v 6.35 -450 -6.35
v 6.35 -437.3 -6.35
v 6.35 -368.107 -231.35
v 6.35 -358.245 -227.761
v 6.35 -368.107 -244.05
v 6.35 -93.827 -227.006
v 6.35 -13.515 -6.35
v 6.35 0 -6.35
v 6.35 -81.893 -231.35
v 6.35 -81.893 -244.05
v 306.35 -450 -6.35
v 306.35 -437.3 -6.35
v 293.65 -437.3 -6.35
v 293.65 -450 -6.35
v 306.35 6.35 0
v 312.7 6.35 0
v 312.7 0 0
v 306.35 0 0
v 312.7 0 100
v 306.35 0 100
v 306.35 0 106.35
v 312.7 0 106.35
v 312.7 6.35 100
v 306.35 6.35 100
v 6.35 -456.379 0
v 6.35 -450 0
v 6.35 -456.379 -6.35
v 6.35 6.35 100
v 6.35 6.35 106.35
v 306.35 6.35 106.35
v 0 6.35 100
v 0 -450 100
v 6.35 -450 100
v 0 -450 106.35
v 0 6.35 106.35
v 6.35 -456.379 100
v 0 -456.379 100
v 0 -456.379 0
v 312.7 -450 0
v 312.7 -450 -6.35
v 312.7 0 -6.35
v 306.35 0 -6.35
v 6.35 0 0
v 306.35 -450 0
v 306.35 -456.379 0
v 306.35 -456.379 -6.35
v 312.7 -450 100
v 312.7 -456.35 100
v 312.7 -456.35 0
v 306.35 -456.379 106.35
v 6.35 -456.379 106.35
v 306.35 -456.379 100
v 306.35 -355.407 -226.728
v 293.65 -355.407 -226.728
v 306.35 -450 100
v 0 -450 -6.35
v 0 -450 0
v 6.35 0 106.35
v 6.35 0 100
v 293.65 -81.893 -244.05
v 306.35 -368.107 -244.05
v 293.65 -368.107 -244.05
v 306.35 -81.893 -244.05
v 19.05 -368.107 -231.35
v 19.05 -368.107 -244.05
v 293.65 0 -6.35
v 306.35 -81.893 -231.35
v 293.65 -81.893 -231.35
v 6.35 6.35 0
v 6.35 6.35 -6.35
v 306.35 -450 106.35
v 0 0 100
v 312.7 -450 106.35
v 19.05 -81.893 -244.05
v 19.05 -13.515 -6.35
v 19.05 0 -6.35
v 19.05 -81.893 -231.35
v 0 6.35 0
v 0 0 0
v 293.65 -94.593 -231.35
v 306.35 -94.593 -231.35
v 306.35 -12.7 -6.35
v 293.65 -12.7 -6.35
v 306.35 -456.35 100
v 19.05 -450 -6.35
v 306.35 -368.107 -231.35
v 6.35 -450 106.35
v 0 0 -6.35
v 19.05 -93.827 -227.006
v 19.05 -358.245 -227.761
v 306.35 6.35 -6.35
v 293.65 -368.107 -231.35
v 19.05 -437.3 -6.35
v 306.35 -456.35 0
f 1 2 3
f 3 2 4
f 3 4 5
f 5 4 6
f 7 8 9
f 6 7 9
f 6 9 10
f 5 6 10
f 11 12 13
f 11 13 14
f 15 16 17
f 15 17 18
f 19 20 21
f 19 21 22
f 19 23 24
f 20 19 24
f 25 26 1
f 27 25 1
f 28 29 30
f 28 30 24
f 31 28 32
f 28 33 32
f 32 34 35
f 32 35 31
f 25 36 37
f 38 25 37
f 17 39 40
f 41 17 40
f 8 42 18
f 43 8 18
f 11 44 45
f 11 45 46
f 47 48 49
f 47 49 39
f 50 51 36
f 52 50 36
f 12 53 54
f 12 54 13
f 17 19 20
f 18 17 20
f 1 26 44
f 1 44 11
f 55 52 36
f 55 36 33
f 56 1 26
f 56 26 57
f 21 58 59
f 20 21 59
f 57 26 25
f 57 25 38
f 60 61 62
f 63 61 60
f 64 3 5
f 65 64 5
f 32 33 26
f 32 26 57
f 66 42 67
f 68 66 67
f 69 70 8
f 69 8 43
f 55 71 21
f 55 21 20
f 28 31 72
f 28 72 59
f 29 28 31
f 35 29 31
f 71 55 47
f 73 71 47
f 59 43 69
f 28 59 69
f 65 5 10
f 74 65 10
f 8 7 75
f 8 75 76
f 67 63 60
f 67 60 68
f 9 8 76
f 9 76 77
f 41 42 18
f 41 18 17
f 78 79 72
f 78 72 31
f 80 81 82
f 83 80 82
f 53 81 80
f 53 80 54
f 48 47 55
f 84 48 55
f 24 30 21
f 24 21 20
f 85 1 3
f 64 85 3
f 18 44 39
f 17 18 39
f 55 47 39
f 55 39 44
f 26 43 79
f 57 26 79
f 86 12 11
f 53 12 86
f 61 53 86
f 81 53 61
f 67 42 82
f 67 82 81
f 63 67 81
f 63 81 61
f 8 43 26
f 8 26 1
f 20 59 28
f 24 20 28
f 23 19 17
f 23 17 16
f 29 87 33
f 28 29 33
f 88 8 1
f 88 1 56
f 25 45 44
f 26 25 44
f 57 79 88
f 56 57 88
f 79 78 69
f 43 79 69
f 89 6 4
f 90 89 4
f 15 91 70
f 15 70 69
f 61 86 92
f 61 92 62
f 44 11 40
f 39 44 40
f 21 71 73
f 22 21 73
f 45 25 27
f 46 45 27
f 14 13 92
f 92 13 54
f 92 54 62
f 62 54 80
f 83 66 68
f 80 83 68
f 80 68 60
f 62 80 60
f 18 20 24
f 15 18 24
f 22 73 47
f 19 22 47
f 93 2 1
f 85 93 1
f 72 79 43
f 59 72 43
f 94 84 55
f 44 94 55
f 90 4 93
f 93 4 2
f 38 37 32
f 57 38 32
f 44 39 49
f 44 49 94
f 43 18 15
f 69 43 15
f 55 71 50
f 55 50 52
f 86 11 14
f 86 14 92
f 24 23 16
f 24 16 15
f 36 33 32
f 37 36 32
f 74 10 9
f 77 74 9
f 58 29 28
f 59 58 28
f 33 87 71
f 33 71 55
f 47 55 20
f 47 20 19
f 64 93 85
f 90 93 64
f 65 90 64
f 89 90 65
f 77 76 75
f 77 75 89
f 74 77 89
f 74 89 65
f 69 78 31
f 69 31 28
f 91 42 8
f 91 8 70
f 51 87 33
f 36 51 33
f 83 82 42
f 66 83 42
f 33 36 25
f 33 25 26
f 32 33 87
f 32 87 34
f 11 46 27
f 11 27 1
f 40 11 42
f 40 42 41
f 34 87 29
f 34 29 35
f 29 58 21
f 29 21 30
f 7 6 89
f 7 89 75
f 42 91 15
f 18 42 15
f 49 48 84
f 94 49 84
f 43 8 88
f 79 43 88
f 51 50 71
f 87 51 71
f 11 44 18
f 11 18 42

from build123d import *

# Parameters (mm, degrees)
SKETCH1_W                = 6.35
SKETCH1_H                = 6.35
BOSS_EXTRUDE1_DEPTH      = 100
SKETCH4_W                = 6.35
SKETCH4_H                = 6.35
BOSS_EXTRUDE3_DEPTH      = 450
BOSS_EXTRUDE3_DEPTH_BACK = 6.35
SKETCH6_W                = 6.35
SKETCH6_H                = 6.378778746
BOSS_EXTRUDE4_DEPTH      = 100
SKETCH7_W                = 6.35
SKETCH7_H                = 6.35
BOSS_EXTRUDE5_DEPTH      = 300
SKETCH8_W                = 6.35
SKETCH8_H                = 6.378778746
BOSS_EXTRUDE6_DEPTH      = 300
SKETCH10_W               = 6.35
SKETCH10_H               = 6.35
BOSS_EXTRUDE7_DEPTH      = 450
SKETCH12_W               = 6.35
SKETCH12_H               = 6.35
BOSS_EXTRUDE8_DEPTH      = 450
SKETCH16_W               = 6.35
SKETCH16_H               = 6.35
BOSS_EXTRUDE9_DEPTH      = 100
SKETCH20_W               = 6.35
SKETCH20_H               = 6.35
BOSS_EXTRUDE10_DEPTH     = 100
SKETCH21_W               = 6.35
SKETCH21_H               = 6.378778746
BOSS_EXTRUDE11_DEPTH     = 300
SKETCH22_W               = 6.35
SKETCH22_H               = 6.35
BOSS_EXTRUDE12_DEPTH     = 450
SKETCH23_W               = 6.35
SKETCH23_H               = 6.35
BOSS_EXTRUDE13_DEPTH     = 300
BOSS_EXTRUDE20_DEPTH     = 12.7
BOSS_EXTRUDE21_DEPTH     = 12.7
BOSS_EXTRUDE22_DEPTH     = 12.7
BOSS_EXTRUDE23_DEPTH     = 12.7
BOSS_EXTRUDE24_DEPTH     = 12.7
BOSS_EXTRUDE25_DEPTH     = 12.7


with BuildPart() as part:
    # Sketch1 → Boss-Extrude1 (new body)
    with BuildSketch(Plane.XY):
        with Locations((3.175, 3.175)):
            Rectangle(SKETCH1_W, SKETCH1_H)
    extrude(amount=BOSS_EXTRUDE1_DEPTH)


with BuildPart() as body_2:
    # Sketch4 → Boss-Extrude3 (new body, two sides)
    with BuildSketch(Plane(origin=(0, 0, 0), x_dir=(-1, 0, 0), z_dir=(0, -1, 0))) as boss_extrude3_sk:
        with Locations((-3.175, -103.175)):
            Rectangle(SKETCH4_W, SKETCH4_H)
    extrude(amount=BOSS_EXTRUDE3_DEPTH)
    extrude(boss_extrude3_sk.sketch, amount=-BOSS_EXTRUDE3_DEPTH_BACK)


with BuildPart() as body_3:
    # Sketch6 → Boss-Extrude4 (new body)
    with BuildSketch(Plane(origin=(0, 0, 100), x_dir=(-1, 0, 0), z_dir=(0, 0, -1))):
        with Locations((-3.175, -453.189389373)):
            Rectangle(SKETCH6_W, SKETCH6_H)
    extrude(amount=BOSS_EXTRUDE4_DEPTH)


with BuildPart() as body_4:
    # Sketch7 → Boss-Extrude5 (new body)
    with BuildSketch(Plane(origin=(6.35, 0, 0), x_dir=(0, 0, -1), z_dir=(1, 0, 0))):
        with Locations((-103.175, 3.175)):
            Rectangle(SKETCH7_W, SKETCH7_H)
    extrude(amount=BOSS_EXTRUDE5_DEPTH)


with BuildPart() as body_5:
    # Sketch8 → Boss-Extrude6 (new body)
    with BuildSketch(Plane(origin=(6.35, 0, 0), x_dir=(0, 0, -1), z_dir=(1, 0, 0))):
        with Locations((-103.175, -453.189389373)):
            Rectangle(SKETCH8_W, SKETCH8_H)
    extrude(amount=BOSS_EXTRUDE6_DEPTH)


with BuildPart() as body_6:
    # Sketch10 → Boss-Extrude7 (new body)
    with BuildSketch(Plane(origin=(0, -450, 0), x_dir=(1, 0, 0), z_dir=(0, 1, 0))):
        with Locations((309.525, -103.175)):
            Rectangle(SKETCH10_W, SKETCH10_H)
    extrude(amount=BOSS_EXTRUDE7_DEPTH)


with BuildPart() as body_7:
    # Sketch12 → Boss-Extrude8 (new body)
    with BuildSketch(Plane(origin=(0, 0, 0), x_dir=(-1, 0, 0), z_dir=(0, -1, 0))):
        with Locations((-3.175, 3.175)):
            Rectangle(SKETCH12_W, SKETCH12_H)
    extrude(amount=BOSS_EXTRUDE8_DEPTH)


with BuildPart() as body_8:
    # Sketch16 → Boss-Extrude9 (new body)
    with BuildSketch(Plane(origin=(0, 0, 100), x_dir=(-1, 0, 0), z_dir=(0, 0, -1))):
        with Locations((-309.525, -453.175)):
            Rectangle(SKETCH16_W, SKETCH16_H)
    extrude(amount=BOSS_EXTRUDE9_DEPTH)


with BuildPart() as body_9:
    # Sketch20 → Boss-Extrude10 (new body)
    with BuildSketch(Plane(origin=(0, 0, 100), x_dir=(-1, 0, 0), z_dir=(0, 0, -1))):
        with Locations((-309.525, 3.175)):
            Rectangle(SKETCH20_W, SKETCH20_H)
    extrude(amount=BOSS_EXTRUDE10_DEPTH)


with BuildPart() as body_10:
    # Sketch21 → Boss-Extrude11 (new body)
    with BuildSketch(Plane(origin=(6.35, 0, 0), x_dir=(0, 0, -1), z_dir=(1, 0, 0))):
        with Locations((3.175, -453.189389373)):
            Rectangle(SKETCH21_W, SKETCH21_H)
    extrude(amount=BOSS_EXTRUDE11_DEPTH)


with BuildPart() as body_11:
    # Sketch22 → Boss-Extrude12 (new body)
    with BuildSketch(Plane(origin=(0, -450, 0), x_dir=(1, 0, 0), z_dir=(0, 1, 0))):
        with Locations((309.525, 3.175)):
            Rectangle(SKETCH22_W, SKETCH22_H)
    extrude(amount=BOSS_EXTRUDE12_DEPTH)


with BuildPart() as body_12:
    # Sketch23 → Boss-Extrude13 (new body)
    with BuildSketch(Plane.ZY.offset(-306.35)):
        with Locations((-3.175, 3.175)):
            Rectangle(SKETCH23_W, SKETCH23_H)
    extrude(amount=BOSS_EXTRUDE13_DEPTH)


with BuildPart() as body_13:
    # Sketch25 → Boss-Extrude20 (new body)
    with BuildSketch(Plane(origin=(6.35, 0, 0), x_dir=(0, 0, -1), z_dir=(1, 0, 0))):
        Polygon((6.35, 0), (231.35, -81.89330271), (227.00634418, -93.827398994), (6.35, -13.51505771), align=None)
    extrude(amount=BOSS_EXTRUDE20_DEPTH)



with BuildPart() as body_14:
    # Sketch26 → Boss-Extrude21 (new body)
    with BuildSketch(Plane.ZY.offset(-306.35)):
        Polygon((-6.35, 0), (-231.35, -81.89330271), (-231.35, -94.59330271), (-6.35, -12.7), align=None)
    extrude(amount=BOSS_EXTRUDE21_DEPTH)



with BuildPart() as body_15:
    # Sketch27 → Boss-Extrude22 (new body)
    with BuildSketch(Plane.ZY.offset(-306.35)):
        Polygon((-6.35, -450), (-231.35, -368.10669729), (-226.727578025, -355.40669729), (-6.35, -437.3), align=None)
    extrude(amount=BOSS_EXTRUDE22_DEPTH)


with BuildPart() as body_16:
    # Sketch28 → Boss-Extrude23 (new body)
    with BuildSketch(Plane(origin=(6.35, 0, 0), x_dir=(0, 0, -1), z_dir=(1, 0, 0))):
        Polygon((6.35, -450), (231.35, -368.10669729), (227.760753861, -358.24532457), (6.35, -437.3), align=None)
    extrude(amount=BOSS_EXTRUDE23_DEPTH)


with BuildPart() as body_14_1:
    add(body_14.part)

    add(body_15.part)  # Boss-Extrude24 merges body 15
    # Sketch29 → Boss-Extrude24 (add)
    with BuildSketch(Plane(origin=(306.35, 0, 0), x_dir=(0, 0, -1), z_dir=(1, 0, 0))):
        Polygon((231.35, -81.89330271), (231.35, -94.59330271), (226.727578025, -355.40669729), (231.35, -368.10669729), (244.05, -368.10669729), (244.05, -81.89330271), align=None)
    extrude(amount=-BOSS_EXTRUDE24_DEPTH)


with BuildPart() as body_13_1:
    add(body_13.part)

    add(body_16.part)  # Boss-Extrude25 merges body 16
    # Sketch31 → Boss-Extrude25 (add)
    with BuildSketch(Plane.ZY.offset(-6.35)):
        Polygon((-231.35, -81.89330271), (-227.00634418, -93.827398994), (-227.760753861, -358.24532457), (-231.35, -368.10669729), (-244.05, -368.10669729), (-244.05, -81.89330271), align=None)
    extrude(amount=-BOSS_EXTRUDE25_DEPTH)


solid = Compound([part.part, body_2.part, body_3.part, body_4.part, body_5.part, body_6.part, body_7.part, body_8.part, body_9.part, body_10.part, body_11.part, body_12.part, body_14_1.part, body_13_1.part])
